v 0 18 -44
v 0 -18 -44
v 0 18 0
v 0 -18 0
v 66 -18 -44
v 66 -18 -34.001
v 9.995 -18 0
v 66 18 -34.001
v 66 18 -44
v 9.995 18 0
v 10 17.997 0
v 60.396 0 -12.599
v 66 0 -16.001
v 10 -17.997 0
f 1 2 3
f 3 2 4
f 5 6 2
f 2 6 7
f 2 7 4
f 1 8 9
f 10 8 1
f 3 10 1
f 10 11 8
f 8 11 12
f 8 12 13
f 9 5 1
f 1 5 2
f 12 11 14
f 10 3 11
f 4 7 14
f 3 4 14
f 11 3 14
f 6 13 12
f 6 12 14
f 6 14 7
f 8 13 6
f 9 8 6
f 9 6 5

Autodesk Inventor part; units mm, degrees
ref_plane "YZ Plane" through (0, 0, 0) normal (1, 0, 0) x (0, 1, 0)
ref_plane "XZ Plane" through (0, 0, 0) normal (0, 1, 0) x (-1, 0, 0)
sketch "草圖1" plane through (0, 0, 0) normal (0, 1, 0) x (-1, 0, 0)
  line L0 (0, 0) -> (-66, 0)
  line L1 (-66, 0) -> (-66, -44)
  line L2 (-66, -44) -> (0, -44)
  line L3 (0, -44) -> (0, 0)
  dimension "d0" = 66
  dimension "d1" = 44
extrude "擠出1" add sketch "草圖1" along normal mid plane 36
sketch "草圖2" plane through (0, 18, 0) normal (0, 1, 0) x (1, 0, 0)
  line L0 (0, 0) -> (66, 0) projected
  line L1 (10, 0) -> (66, 14)
  line L2 (66, 0) -> (66, 44) projected
  dimension "d4" = 10
  dimension "d5" = 30
extrude "擠出2" cut sketch "草圖2" against normal blind 40
sketch "草圖3" plane through (66, -18, -44) normal (1, 0, 0) x (0, 0, -1)
  line L0 (-30, 16) -> (-10, 36)
  line L1 (0, 36) -> (-44, 36) projected
  line L2 (-30, 36) -> (-30, 0) projected
  point P0 (-44, 18)
  dimension "d8" = 20
  dimension "d9" = 20
ref_plane "工作平面1" through (10, 18, 0) normal (-0.3945, -0.6498, -0.6498) x (0.8548, 0, -0.519)
sketch "草圖4" plane through (10, 18, 0) normal (-0.3945, -0.6498, -0.6498) x (0.8548, 0, -0.519)
  line L0 (-15.1543, -12.3218) -> (93.717, -12.3218)
  line L1 (93.717, -12.3218) -> (93.717, 28.8166)
  line L2 (93.717, 28.8166) -> (-15.1543, 28.8166)
  line L3 (-15.1543, 28.8166) -> (-15.1543, -12.3218)
  point P0 (-8.5479, 10.3104)
extrude "擠出3" cut sketch "草圖4" against normal blind 40
mirror "鏡射1" about plane through (0, 0, 0) normal (0, 1, 0) of "擠出3"
properties part number "25"
